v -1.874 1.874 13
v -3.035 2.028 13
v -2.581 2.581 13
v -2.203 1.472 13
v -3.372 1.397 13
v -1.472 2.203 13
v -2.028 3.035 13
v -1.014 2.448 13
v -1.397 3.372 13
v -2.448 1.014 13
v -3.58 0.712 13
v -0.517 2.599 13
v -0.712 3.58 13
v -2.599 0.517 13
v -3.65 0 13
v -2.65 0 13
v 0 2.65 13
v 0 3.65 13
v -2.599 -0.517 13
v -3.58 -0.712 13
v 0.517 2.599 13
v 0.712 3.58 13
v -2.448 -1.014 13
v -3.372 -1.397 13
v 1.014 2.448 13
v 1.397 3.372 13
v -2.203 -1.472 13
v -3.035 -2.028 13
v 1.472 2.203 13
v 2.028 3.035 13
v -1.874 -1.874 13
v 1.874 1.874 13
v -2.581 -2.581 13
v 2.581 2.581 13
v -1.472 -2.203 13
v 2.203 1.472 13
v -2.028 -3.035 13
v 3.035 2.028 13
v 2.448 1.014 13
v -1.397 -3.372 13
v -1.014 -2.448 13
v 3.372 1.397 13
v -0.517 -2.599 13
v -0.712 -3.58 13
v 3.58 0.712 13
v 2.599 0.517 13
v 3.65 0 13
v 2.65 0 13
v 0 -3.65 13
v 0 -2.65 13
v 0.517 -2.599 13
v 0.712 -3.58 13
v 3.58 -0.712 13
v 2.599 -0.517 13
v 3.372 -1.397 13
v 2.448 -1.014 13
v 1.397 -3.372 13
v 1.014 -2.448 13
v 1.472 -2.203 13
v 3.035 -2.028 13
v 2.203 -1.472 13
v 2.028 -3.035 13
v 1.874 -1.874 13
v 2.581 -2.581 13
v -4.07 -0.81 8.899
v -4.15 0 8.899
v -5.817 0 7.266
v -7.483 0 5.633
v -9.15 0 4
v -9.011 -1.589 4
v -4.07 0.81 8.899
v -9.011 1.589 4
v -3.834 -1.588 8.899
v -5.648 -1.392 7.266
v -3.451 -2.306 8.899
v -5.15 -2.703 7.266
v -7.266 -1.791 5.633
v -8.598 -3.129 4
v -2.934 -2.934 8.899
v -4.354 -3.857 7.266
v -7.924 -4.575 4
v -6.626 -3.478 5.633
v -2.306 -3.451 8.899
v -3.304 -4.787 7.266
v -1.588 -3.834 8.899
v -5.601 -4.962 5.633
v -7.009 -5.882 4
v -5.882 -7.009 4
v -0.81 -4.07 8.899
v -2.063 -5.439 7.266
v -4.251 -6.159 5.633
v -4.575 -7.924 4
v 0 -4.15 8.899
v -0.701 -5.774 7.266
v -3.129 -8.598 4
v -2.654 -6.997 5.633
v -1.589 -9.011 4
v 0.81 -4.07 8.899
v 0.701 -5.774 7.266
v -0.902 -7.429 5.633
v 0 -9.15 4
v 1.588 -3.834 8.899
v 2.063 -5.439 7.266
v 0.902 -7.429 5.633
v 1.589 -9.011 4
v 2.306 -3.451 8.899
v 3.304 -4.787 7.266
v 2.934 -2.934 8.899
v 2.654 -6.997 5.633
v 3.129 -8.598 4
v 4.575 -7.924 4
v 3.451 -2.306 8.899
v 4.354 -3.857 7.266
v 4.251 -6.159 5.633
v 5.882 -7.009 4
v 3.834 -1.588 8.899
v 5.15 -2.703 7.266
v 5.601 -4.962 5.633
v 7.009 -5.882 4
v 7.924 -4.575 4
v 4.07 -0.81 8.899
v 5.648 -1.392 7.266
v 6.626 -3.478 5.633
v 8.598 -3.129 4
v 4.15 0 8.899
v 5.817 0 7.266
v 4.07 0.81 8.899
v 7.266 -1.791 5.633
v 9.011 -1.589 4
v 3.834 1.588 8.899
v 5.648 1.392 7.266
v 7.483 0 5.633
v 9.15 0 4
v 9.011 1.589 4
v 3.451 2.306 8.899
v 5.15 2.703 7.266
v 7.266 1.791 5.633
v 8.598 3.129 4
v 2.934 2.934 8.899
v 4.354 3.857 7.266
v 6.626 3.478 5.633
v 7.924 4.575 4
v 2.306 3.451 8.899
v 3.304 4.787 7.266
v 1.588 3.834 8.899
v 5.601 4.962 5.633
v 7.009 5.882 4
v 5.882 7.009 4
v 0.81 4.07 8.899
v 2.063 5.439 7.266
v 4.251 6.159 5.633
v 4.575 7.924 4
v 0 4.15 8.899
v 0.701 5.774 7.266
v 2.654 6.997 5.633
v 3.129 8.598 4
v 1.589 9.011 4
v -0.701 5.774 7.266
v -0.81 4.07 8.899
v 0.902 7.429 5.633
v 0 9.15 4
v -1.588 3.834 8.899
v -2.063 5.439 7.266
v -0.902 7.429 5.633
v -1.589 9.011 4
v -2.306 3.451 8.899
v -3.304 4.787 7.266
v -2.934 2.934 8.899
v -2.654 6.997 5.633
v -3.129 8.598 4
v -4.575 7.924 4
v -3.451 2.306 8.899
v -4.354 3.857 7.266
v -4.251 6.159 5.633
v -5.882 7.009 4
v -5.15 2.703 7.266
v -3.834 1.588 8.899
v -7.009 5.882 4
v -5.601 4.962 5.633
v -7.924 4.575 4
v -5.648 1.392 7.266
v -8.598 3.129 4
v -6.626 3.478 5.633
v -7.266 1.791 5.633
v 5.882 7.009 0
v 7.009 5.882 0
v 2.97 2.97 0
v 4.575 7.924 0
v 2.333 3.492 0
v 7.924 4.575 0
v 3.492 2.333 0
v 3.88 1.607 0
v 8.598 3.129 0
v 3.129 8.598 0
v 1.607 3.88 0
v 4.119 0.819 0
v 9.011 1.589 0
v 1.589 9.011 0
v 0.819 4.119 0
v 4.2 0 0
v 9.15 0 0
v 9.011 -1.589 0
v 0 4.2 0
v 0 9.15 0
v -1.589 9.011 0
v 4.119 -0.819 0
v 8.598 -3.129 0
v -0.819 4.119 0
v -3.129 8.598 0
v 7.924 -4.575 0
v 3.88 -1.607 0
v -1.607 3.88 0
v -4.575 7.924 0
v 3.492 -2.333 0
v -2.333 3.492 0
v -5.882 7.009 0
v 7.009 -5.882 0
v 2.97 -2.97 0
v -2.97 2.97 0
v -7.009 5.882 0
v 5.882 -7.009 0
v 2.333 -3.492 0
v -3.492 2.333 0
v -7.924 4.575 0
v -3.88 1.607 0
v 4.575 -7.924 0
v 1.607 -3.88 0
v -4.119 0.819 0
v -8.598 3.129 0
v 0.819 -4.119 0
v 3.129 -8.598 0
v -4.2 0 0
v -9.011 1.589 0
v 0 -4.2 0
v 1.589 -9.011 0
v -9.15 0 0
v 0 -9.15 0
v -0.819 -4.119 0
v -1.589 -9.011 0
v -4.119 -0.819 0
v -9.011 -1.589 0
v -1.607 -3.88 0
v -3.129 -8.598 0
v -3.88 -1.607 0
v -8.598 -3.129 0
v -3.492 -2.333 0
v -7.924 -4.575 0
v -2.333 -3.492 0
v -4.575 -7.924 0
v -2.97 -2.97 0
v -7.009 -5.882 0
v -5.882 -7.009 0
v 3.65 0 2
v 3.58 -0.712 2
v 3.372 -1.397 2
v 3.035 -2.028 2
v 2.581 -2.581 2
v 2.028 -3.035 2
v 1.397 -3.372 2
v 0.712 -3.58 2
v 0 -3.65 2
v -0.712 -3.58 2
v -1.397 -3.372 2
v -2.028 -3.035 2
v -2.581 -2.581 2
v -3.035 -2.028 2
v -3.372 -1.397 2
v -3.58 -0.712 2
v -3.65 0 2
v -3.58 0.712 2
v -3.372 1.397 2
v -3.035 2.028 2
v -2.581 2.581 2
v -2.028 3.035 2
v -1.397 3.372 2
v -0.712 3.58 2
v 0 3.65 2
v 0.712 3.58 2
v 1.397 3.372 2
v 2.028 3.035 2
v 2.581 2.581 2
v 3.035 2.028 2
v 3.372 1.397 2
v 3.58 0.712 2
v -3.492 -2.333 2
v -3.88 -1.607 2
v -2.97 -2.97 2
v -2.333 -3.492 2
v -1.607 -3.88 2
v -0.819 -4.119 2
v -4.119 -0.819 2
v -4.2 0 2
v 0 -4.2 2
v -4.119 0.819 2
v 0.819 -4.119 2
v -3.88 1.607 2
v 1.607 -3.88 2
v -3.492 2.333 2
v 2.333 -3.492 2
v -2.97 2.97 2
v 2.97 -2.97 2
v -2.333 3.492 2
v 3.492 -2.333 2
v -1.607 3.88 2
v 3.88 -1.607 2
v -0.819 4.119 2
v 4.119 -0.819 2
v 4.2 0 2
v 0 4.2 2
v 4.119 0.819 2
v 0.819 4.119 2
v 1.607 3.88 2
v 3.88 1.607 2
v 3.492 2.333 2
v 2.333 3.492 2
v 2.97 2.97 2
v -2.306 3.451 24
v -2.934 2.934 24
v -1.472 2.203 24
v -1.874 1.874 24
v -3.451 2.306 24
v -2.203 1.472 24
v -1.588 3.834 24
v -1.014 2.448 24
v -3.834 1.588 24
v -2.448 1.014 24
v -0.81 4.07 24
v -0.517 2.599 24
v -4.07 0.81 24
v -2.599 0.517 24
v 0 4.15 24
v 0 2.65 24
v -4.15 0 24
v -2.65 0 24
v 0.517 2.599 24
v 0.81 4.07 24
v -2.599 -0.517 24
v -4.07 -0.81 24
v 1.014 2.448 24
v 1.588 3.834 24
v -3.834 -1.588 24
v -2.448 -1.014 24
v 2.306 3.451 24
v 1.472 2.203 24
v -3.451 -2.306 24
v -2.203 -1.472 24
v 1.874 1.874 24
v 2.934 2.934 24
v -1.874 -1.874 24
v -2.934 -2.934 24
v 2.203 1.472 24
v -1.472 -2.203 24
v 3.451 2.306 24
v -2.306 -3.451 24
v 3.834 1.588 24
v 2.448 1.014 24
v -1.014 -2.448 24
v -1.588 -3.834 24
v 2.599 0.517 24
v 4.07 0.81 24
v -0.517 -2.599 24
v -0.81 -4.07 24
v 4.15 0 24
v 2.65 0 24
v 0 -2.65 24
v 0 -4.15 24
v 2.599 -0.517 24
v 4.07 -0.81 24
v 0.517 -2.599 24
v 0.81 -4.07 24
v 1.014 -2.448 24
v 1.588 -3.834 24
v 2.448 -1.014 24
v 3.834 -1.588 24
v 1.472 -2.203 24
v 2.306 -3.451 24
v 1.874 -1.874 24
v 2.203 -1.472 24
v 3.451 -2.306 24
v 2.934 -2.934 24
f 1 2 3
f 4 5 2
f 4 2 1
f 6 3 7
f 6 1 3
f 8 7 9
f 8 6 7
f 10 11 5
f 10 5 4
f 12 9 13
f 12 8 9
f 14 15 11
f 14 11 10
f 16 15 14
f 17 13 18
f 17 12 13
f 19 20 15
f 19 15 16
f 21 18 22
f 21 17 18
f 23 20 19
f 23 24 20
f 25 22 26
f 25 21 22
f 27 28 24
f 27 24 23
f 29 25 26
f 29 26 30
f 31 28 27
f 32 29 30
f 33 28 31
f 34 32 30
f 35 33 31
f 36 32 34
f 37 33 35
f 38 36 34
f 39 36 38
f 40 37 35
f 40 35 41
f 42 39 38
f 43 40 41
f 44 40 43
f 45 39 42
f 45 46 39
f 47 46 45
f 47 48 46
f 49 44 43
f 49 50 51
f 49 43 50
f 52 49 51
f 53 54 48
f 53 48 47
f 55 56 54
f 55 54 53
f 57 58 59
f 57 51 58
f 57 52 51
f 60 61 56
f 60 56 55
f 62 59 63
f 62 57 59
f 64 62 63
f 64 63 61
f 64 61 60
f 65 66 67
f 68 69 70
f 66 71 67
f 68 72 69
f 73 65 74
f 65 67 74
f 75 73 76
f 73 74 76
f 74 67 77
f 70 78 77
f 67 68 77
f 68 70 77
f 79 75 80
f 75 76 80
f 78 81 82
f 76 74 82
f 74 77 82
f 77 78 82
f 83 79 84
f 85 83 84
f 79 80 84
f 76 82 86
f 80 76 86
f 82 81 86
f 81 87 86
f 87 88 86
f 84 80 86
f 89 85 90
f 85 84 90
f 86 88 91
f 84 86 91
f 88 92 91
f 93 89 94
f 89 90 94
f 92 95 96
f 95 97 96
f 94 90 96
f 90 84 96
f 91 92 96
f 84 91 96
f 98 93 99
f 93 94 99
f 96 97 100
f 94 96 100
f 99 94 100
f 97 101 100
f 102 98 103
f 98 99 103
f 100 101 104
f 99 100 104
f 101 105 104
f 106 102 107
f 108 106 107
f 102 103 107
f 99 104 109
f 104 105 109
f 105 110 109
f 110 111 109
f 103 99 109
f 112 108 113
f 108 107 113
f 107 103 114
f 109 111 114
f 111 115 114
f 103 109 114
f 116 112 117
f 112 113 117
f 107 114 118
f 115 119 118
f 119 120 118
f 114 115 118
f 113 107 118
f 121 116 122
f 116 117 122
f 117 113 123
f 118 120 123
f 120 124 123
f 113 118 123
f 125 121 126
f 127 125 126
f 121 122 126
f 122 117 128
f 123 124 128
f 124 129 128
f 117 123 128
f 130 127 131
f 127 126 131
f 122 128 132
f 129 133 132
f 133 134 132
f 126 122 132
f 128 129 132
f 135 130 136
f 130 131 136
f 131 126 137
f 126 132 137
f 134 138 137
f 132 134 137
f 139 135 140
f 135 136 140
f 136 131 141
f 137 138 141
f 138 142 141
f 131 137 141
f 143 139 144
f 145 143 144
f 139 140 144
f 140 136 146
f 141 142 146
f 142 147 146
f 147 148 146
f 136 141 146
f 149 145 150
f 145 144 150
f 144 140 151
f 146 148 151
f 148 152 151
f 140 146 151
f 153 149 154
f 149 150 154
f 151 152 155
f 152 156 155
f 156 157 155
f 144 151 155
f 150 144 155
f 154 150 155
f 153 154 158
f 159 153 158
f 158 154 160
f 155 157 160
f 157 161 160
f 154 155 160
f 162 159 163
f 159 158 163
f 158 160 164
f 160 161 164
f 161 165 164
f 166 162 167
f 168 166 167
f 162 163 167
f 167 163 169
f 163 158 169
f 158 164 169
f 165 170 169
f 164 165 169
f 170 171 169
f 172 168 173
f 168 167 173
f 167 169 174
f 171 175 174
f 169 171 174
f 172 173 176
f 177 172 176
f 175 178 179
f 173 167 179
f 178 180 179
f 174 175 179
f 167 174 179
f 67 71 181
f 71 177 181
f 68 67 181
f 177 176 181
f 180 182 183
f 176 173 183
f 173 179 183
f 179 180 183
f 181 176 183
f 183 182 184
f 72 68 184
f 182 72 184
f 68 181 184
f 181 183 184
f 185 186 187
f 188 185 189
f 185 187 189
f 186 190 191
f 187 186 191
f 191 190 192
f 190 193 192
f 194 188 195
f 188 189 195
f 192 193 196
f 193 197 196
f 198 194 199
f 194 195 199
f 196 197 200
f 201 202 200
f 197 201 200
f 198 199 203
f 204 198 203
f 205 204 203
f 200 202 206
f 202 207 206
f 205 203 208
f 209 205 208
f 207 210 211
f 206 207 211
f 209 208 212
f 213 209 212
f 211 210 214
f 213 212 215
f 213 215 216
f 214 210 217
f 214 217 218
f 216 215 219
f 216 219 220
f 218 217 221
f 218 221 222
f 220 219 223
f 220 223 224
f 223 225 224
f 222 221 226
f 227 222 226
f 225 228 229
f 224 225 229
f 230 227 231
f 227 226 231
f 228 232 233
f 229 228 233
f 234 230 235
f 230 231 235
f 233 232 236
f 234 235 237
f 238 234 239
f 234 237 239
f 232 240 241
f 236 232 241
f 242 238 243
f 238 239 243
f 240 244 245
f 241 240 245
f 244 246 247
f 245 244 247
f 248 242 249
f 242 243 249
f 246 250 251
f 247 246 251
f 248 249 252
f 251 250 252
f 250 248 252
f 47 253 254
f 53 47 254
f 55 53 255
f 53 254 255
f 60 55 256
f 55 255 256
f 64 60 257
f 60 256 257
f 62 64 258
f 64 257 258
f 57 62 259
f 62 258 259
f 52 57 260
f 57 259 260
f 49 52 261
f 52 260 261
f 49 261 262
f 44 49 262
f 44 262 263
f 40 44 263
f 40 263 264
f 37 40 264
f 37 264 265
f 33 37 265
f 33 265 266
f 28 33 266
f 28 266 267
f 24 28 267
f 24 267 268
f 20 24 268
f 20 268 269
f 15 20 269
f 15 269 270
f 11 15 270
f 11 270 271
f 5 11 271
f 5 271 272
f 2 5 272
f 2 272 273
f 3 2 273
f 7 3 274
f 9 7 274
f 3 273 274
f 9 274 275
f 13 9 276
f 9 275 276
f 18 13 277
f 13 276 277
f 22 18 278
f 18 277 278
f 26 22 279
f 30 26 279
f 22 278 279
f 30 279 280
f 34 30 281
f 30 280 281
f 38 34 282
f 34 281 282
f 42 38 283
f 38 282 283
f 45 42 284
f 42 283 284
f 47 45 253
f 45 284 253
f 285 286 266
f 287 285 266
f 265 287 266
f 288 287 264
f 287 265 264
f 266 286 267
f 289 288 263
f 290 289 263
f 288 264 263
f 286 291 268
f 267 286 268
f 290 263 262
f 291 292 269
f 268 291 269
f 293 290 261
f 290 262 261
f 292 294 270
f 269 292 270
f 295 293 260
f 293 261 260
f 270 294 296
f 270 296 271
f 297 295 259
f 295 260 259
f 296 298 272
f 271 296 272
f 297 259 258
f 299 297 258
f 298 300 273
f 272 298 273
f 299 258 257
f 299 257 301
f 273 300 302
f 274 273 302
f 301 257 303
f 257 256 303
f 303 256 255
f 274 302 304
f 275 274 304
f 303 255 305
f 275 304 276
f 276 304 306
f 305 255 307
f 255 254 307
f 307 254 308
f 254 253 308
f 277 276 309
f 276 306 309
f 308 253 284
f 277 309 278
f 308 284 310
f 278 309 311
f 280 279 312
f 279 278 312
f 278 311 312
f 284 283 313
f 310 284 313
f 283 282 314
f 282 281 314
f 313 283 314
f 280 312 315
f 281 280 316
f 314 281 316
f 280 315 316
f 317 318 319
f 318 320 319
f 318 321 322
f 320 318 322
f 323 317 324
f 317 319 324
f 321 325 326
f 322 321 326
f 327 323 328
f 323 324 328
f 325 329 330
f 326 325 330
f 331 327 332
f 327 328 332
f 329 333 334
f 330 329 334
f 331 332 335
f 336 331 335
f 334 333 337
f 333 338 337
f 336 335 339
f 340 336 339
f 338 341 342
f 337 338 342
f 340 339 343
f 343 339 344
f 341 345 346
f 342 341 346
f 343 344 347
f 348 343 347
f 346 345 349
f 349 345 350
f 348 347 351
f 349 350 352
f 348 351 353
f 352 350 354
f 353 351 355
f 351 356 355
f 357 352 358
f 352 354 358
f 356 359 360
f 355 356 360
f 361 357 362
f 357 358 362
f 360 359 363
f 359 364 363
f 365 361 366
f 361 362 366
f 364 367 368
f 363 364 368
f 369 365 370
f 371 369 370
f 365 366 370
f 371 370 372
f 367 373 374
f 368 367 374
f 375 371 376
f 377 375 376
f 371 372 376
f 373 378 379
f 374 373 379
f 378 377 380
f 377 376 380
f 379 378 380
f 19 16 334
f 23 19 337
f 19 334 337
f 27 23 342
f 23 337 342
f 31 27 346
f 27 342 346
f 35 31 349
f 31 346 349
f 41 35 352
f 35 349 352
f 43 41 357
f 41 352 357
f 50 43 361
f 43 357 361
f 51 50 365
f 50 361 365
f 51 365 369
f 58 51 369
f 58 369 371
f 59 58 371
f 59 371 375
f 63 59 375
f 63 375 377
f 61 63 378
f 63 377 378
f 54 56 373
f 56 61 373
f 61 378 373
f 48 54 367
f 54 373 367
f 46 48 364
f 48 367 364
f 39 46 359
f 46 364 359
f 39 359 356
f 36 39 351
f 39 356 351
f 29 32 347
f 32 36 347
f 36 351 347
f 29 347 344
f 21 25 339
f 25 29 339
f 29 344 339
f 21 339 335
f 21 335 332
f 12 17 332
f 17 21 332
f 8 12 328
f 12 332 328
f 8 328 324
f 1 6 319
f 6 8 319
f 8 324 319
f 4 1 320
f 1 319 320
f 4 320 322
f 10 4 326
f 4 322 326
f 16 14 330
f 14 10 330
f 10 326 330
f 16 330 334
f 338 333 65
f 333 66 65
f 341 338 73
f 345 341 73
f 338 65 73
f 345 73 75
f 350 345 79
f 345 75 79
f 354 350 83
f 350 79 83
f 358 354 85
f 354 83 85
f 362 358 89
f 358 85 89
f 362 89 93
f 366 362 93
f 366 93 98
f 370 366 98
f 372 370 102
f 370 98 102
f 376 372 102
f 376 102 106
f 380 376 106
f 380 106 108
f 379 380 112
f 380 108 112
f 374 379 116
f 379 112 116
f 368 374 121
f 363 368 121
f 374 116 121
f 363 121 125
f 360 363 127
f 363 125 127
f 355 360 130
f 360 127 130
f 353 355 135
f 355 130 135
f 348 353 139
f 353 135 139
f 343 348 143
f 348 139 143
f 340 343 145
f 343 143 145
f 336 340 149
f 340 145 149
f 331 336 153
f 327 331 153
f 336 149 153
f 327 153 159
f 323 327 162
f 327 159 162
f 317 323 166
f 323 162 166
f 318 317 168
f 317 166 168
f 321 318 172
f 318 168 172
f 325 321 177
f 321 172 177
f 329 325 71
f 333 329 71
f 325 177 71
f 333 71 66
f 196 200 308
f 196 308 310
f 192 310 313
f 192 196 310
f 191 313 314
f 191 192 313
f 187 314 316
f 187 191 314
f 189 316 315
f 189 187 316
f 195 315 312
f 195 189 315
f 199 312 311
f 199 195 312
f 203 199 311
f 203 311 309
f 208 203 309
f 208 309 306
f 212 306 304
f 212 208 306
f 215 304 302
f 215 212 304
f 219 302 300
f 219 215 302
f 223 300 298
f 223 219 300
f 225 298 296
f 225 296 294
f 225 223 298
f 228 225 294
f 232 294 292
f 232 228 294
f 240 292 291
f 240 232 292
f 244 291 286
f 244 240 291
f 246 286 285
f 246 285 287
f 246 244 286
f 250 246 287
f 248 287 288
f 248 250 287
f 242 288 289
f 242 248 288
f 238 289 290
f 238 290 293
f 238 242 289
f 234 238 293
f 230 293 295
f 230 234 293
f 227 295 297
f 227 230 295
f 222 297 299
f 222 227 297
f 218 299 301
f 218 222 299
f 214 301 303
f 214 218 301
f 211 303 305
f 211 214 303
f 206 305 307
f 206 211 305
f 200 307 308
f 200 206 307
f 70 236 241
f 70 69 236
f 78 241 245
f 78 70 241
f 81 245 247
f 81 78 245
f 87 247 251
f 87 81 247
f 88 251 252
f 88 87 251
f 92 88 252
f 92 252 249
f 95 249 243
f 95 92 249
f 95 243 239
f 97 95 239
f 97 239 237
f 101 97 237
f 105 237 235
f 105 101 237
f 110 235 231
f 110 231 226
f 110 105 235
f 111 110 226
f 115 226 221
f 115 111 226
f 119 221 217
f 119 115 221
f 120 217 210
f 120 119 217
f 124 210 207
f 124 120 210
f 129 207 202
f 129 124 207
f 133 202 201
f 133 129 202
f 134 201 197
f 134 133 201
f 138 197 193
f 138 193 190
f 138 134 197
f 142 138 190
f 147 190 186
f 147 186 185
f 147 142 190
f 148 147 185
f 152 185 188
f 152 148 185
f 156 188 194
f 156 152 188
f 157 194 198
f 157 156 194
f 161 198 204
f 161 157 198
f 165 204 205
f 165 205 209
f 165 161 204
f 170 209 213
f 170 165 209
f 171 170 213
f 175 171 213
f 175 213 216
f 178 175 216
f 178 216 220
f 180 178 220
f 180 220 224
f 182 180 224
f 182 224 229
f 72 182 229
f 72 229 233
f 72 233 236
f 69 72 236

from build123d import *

# Parameters (mm, degrees)
F0_W        = 5
F0_H        = 4
F2_R        = 4.2
F2_R_2      = 3.65
F3_DEPTH    = 2
F3_FACE_R   = 3.65
F3_FACE_R_2 = 2.65
F4_DEPTH    = 13


with BuildPart() as f1:
    # F0 (on Front) → F1 (revolve)
    with BuildSketch(Plane.XZ):
        Polygon((-4.15, 0), (-2.65, 0), (-2.65, 24), (-4.15, 24), (-4.15, 8.898979), (-4.15, 4), align=None)
        with Locations((-6.65, 2)):
            Rectangle(F0_W, F0_H)
        Polygon((-9.15, 4), (-4.15, 4), (-4.15, 8.898979), align=None)
    revolve(axis=Axis((0, 0, 13.376878), (0, 0, 1)))

    # F2 (on Top) → F3 (cut)
    with BuildSketch(Plane.XY):
        Circle(F2_R)
        Circle(F2_R_2, mode=Mode.SUBTRACT)
    extrude(amount=F3_DEPTH, mode=Mode.SUBTRACT)

    # F3_face (on face) → F4 (cut)
    with BuildSketch(Plane(origin=(0, 0, 0), x_dir=(1, 0, 0), z_dir=(0, 0, -1))):
        Circle(F3_FACE_R)
        Circle(F3_FACE_R_2, mode=Mode.SUBTRACT)
    extrude(amount=-F4_DEPTH, mode=Mode.SUBTRACT)


solid = f1.part
